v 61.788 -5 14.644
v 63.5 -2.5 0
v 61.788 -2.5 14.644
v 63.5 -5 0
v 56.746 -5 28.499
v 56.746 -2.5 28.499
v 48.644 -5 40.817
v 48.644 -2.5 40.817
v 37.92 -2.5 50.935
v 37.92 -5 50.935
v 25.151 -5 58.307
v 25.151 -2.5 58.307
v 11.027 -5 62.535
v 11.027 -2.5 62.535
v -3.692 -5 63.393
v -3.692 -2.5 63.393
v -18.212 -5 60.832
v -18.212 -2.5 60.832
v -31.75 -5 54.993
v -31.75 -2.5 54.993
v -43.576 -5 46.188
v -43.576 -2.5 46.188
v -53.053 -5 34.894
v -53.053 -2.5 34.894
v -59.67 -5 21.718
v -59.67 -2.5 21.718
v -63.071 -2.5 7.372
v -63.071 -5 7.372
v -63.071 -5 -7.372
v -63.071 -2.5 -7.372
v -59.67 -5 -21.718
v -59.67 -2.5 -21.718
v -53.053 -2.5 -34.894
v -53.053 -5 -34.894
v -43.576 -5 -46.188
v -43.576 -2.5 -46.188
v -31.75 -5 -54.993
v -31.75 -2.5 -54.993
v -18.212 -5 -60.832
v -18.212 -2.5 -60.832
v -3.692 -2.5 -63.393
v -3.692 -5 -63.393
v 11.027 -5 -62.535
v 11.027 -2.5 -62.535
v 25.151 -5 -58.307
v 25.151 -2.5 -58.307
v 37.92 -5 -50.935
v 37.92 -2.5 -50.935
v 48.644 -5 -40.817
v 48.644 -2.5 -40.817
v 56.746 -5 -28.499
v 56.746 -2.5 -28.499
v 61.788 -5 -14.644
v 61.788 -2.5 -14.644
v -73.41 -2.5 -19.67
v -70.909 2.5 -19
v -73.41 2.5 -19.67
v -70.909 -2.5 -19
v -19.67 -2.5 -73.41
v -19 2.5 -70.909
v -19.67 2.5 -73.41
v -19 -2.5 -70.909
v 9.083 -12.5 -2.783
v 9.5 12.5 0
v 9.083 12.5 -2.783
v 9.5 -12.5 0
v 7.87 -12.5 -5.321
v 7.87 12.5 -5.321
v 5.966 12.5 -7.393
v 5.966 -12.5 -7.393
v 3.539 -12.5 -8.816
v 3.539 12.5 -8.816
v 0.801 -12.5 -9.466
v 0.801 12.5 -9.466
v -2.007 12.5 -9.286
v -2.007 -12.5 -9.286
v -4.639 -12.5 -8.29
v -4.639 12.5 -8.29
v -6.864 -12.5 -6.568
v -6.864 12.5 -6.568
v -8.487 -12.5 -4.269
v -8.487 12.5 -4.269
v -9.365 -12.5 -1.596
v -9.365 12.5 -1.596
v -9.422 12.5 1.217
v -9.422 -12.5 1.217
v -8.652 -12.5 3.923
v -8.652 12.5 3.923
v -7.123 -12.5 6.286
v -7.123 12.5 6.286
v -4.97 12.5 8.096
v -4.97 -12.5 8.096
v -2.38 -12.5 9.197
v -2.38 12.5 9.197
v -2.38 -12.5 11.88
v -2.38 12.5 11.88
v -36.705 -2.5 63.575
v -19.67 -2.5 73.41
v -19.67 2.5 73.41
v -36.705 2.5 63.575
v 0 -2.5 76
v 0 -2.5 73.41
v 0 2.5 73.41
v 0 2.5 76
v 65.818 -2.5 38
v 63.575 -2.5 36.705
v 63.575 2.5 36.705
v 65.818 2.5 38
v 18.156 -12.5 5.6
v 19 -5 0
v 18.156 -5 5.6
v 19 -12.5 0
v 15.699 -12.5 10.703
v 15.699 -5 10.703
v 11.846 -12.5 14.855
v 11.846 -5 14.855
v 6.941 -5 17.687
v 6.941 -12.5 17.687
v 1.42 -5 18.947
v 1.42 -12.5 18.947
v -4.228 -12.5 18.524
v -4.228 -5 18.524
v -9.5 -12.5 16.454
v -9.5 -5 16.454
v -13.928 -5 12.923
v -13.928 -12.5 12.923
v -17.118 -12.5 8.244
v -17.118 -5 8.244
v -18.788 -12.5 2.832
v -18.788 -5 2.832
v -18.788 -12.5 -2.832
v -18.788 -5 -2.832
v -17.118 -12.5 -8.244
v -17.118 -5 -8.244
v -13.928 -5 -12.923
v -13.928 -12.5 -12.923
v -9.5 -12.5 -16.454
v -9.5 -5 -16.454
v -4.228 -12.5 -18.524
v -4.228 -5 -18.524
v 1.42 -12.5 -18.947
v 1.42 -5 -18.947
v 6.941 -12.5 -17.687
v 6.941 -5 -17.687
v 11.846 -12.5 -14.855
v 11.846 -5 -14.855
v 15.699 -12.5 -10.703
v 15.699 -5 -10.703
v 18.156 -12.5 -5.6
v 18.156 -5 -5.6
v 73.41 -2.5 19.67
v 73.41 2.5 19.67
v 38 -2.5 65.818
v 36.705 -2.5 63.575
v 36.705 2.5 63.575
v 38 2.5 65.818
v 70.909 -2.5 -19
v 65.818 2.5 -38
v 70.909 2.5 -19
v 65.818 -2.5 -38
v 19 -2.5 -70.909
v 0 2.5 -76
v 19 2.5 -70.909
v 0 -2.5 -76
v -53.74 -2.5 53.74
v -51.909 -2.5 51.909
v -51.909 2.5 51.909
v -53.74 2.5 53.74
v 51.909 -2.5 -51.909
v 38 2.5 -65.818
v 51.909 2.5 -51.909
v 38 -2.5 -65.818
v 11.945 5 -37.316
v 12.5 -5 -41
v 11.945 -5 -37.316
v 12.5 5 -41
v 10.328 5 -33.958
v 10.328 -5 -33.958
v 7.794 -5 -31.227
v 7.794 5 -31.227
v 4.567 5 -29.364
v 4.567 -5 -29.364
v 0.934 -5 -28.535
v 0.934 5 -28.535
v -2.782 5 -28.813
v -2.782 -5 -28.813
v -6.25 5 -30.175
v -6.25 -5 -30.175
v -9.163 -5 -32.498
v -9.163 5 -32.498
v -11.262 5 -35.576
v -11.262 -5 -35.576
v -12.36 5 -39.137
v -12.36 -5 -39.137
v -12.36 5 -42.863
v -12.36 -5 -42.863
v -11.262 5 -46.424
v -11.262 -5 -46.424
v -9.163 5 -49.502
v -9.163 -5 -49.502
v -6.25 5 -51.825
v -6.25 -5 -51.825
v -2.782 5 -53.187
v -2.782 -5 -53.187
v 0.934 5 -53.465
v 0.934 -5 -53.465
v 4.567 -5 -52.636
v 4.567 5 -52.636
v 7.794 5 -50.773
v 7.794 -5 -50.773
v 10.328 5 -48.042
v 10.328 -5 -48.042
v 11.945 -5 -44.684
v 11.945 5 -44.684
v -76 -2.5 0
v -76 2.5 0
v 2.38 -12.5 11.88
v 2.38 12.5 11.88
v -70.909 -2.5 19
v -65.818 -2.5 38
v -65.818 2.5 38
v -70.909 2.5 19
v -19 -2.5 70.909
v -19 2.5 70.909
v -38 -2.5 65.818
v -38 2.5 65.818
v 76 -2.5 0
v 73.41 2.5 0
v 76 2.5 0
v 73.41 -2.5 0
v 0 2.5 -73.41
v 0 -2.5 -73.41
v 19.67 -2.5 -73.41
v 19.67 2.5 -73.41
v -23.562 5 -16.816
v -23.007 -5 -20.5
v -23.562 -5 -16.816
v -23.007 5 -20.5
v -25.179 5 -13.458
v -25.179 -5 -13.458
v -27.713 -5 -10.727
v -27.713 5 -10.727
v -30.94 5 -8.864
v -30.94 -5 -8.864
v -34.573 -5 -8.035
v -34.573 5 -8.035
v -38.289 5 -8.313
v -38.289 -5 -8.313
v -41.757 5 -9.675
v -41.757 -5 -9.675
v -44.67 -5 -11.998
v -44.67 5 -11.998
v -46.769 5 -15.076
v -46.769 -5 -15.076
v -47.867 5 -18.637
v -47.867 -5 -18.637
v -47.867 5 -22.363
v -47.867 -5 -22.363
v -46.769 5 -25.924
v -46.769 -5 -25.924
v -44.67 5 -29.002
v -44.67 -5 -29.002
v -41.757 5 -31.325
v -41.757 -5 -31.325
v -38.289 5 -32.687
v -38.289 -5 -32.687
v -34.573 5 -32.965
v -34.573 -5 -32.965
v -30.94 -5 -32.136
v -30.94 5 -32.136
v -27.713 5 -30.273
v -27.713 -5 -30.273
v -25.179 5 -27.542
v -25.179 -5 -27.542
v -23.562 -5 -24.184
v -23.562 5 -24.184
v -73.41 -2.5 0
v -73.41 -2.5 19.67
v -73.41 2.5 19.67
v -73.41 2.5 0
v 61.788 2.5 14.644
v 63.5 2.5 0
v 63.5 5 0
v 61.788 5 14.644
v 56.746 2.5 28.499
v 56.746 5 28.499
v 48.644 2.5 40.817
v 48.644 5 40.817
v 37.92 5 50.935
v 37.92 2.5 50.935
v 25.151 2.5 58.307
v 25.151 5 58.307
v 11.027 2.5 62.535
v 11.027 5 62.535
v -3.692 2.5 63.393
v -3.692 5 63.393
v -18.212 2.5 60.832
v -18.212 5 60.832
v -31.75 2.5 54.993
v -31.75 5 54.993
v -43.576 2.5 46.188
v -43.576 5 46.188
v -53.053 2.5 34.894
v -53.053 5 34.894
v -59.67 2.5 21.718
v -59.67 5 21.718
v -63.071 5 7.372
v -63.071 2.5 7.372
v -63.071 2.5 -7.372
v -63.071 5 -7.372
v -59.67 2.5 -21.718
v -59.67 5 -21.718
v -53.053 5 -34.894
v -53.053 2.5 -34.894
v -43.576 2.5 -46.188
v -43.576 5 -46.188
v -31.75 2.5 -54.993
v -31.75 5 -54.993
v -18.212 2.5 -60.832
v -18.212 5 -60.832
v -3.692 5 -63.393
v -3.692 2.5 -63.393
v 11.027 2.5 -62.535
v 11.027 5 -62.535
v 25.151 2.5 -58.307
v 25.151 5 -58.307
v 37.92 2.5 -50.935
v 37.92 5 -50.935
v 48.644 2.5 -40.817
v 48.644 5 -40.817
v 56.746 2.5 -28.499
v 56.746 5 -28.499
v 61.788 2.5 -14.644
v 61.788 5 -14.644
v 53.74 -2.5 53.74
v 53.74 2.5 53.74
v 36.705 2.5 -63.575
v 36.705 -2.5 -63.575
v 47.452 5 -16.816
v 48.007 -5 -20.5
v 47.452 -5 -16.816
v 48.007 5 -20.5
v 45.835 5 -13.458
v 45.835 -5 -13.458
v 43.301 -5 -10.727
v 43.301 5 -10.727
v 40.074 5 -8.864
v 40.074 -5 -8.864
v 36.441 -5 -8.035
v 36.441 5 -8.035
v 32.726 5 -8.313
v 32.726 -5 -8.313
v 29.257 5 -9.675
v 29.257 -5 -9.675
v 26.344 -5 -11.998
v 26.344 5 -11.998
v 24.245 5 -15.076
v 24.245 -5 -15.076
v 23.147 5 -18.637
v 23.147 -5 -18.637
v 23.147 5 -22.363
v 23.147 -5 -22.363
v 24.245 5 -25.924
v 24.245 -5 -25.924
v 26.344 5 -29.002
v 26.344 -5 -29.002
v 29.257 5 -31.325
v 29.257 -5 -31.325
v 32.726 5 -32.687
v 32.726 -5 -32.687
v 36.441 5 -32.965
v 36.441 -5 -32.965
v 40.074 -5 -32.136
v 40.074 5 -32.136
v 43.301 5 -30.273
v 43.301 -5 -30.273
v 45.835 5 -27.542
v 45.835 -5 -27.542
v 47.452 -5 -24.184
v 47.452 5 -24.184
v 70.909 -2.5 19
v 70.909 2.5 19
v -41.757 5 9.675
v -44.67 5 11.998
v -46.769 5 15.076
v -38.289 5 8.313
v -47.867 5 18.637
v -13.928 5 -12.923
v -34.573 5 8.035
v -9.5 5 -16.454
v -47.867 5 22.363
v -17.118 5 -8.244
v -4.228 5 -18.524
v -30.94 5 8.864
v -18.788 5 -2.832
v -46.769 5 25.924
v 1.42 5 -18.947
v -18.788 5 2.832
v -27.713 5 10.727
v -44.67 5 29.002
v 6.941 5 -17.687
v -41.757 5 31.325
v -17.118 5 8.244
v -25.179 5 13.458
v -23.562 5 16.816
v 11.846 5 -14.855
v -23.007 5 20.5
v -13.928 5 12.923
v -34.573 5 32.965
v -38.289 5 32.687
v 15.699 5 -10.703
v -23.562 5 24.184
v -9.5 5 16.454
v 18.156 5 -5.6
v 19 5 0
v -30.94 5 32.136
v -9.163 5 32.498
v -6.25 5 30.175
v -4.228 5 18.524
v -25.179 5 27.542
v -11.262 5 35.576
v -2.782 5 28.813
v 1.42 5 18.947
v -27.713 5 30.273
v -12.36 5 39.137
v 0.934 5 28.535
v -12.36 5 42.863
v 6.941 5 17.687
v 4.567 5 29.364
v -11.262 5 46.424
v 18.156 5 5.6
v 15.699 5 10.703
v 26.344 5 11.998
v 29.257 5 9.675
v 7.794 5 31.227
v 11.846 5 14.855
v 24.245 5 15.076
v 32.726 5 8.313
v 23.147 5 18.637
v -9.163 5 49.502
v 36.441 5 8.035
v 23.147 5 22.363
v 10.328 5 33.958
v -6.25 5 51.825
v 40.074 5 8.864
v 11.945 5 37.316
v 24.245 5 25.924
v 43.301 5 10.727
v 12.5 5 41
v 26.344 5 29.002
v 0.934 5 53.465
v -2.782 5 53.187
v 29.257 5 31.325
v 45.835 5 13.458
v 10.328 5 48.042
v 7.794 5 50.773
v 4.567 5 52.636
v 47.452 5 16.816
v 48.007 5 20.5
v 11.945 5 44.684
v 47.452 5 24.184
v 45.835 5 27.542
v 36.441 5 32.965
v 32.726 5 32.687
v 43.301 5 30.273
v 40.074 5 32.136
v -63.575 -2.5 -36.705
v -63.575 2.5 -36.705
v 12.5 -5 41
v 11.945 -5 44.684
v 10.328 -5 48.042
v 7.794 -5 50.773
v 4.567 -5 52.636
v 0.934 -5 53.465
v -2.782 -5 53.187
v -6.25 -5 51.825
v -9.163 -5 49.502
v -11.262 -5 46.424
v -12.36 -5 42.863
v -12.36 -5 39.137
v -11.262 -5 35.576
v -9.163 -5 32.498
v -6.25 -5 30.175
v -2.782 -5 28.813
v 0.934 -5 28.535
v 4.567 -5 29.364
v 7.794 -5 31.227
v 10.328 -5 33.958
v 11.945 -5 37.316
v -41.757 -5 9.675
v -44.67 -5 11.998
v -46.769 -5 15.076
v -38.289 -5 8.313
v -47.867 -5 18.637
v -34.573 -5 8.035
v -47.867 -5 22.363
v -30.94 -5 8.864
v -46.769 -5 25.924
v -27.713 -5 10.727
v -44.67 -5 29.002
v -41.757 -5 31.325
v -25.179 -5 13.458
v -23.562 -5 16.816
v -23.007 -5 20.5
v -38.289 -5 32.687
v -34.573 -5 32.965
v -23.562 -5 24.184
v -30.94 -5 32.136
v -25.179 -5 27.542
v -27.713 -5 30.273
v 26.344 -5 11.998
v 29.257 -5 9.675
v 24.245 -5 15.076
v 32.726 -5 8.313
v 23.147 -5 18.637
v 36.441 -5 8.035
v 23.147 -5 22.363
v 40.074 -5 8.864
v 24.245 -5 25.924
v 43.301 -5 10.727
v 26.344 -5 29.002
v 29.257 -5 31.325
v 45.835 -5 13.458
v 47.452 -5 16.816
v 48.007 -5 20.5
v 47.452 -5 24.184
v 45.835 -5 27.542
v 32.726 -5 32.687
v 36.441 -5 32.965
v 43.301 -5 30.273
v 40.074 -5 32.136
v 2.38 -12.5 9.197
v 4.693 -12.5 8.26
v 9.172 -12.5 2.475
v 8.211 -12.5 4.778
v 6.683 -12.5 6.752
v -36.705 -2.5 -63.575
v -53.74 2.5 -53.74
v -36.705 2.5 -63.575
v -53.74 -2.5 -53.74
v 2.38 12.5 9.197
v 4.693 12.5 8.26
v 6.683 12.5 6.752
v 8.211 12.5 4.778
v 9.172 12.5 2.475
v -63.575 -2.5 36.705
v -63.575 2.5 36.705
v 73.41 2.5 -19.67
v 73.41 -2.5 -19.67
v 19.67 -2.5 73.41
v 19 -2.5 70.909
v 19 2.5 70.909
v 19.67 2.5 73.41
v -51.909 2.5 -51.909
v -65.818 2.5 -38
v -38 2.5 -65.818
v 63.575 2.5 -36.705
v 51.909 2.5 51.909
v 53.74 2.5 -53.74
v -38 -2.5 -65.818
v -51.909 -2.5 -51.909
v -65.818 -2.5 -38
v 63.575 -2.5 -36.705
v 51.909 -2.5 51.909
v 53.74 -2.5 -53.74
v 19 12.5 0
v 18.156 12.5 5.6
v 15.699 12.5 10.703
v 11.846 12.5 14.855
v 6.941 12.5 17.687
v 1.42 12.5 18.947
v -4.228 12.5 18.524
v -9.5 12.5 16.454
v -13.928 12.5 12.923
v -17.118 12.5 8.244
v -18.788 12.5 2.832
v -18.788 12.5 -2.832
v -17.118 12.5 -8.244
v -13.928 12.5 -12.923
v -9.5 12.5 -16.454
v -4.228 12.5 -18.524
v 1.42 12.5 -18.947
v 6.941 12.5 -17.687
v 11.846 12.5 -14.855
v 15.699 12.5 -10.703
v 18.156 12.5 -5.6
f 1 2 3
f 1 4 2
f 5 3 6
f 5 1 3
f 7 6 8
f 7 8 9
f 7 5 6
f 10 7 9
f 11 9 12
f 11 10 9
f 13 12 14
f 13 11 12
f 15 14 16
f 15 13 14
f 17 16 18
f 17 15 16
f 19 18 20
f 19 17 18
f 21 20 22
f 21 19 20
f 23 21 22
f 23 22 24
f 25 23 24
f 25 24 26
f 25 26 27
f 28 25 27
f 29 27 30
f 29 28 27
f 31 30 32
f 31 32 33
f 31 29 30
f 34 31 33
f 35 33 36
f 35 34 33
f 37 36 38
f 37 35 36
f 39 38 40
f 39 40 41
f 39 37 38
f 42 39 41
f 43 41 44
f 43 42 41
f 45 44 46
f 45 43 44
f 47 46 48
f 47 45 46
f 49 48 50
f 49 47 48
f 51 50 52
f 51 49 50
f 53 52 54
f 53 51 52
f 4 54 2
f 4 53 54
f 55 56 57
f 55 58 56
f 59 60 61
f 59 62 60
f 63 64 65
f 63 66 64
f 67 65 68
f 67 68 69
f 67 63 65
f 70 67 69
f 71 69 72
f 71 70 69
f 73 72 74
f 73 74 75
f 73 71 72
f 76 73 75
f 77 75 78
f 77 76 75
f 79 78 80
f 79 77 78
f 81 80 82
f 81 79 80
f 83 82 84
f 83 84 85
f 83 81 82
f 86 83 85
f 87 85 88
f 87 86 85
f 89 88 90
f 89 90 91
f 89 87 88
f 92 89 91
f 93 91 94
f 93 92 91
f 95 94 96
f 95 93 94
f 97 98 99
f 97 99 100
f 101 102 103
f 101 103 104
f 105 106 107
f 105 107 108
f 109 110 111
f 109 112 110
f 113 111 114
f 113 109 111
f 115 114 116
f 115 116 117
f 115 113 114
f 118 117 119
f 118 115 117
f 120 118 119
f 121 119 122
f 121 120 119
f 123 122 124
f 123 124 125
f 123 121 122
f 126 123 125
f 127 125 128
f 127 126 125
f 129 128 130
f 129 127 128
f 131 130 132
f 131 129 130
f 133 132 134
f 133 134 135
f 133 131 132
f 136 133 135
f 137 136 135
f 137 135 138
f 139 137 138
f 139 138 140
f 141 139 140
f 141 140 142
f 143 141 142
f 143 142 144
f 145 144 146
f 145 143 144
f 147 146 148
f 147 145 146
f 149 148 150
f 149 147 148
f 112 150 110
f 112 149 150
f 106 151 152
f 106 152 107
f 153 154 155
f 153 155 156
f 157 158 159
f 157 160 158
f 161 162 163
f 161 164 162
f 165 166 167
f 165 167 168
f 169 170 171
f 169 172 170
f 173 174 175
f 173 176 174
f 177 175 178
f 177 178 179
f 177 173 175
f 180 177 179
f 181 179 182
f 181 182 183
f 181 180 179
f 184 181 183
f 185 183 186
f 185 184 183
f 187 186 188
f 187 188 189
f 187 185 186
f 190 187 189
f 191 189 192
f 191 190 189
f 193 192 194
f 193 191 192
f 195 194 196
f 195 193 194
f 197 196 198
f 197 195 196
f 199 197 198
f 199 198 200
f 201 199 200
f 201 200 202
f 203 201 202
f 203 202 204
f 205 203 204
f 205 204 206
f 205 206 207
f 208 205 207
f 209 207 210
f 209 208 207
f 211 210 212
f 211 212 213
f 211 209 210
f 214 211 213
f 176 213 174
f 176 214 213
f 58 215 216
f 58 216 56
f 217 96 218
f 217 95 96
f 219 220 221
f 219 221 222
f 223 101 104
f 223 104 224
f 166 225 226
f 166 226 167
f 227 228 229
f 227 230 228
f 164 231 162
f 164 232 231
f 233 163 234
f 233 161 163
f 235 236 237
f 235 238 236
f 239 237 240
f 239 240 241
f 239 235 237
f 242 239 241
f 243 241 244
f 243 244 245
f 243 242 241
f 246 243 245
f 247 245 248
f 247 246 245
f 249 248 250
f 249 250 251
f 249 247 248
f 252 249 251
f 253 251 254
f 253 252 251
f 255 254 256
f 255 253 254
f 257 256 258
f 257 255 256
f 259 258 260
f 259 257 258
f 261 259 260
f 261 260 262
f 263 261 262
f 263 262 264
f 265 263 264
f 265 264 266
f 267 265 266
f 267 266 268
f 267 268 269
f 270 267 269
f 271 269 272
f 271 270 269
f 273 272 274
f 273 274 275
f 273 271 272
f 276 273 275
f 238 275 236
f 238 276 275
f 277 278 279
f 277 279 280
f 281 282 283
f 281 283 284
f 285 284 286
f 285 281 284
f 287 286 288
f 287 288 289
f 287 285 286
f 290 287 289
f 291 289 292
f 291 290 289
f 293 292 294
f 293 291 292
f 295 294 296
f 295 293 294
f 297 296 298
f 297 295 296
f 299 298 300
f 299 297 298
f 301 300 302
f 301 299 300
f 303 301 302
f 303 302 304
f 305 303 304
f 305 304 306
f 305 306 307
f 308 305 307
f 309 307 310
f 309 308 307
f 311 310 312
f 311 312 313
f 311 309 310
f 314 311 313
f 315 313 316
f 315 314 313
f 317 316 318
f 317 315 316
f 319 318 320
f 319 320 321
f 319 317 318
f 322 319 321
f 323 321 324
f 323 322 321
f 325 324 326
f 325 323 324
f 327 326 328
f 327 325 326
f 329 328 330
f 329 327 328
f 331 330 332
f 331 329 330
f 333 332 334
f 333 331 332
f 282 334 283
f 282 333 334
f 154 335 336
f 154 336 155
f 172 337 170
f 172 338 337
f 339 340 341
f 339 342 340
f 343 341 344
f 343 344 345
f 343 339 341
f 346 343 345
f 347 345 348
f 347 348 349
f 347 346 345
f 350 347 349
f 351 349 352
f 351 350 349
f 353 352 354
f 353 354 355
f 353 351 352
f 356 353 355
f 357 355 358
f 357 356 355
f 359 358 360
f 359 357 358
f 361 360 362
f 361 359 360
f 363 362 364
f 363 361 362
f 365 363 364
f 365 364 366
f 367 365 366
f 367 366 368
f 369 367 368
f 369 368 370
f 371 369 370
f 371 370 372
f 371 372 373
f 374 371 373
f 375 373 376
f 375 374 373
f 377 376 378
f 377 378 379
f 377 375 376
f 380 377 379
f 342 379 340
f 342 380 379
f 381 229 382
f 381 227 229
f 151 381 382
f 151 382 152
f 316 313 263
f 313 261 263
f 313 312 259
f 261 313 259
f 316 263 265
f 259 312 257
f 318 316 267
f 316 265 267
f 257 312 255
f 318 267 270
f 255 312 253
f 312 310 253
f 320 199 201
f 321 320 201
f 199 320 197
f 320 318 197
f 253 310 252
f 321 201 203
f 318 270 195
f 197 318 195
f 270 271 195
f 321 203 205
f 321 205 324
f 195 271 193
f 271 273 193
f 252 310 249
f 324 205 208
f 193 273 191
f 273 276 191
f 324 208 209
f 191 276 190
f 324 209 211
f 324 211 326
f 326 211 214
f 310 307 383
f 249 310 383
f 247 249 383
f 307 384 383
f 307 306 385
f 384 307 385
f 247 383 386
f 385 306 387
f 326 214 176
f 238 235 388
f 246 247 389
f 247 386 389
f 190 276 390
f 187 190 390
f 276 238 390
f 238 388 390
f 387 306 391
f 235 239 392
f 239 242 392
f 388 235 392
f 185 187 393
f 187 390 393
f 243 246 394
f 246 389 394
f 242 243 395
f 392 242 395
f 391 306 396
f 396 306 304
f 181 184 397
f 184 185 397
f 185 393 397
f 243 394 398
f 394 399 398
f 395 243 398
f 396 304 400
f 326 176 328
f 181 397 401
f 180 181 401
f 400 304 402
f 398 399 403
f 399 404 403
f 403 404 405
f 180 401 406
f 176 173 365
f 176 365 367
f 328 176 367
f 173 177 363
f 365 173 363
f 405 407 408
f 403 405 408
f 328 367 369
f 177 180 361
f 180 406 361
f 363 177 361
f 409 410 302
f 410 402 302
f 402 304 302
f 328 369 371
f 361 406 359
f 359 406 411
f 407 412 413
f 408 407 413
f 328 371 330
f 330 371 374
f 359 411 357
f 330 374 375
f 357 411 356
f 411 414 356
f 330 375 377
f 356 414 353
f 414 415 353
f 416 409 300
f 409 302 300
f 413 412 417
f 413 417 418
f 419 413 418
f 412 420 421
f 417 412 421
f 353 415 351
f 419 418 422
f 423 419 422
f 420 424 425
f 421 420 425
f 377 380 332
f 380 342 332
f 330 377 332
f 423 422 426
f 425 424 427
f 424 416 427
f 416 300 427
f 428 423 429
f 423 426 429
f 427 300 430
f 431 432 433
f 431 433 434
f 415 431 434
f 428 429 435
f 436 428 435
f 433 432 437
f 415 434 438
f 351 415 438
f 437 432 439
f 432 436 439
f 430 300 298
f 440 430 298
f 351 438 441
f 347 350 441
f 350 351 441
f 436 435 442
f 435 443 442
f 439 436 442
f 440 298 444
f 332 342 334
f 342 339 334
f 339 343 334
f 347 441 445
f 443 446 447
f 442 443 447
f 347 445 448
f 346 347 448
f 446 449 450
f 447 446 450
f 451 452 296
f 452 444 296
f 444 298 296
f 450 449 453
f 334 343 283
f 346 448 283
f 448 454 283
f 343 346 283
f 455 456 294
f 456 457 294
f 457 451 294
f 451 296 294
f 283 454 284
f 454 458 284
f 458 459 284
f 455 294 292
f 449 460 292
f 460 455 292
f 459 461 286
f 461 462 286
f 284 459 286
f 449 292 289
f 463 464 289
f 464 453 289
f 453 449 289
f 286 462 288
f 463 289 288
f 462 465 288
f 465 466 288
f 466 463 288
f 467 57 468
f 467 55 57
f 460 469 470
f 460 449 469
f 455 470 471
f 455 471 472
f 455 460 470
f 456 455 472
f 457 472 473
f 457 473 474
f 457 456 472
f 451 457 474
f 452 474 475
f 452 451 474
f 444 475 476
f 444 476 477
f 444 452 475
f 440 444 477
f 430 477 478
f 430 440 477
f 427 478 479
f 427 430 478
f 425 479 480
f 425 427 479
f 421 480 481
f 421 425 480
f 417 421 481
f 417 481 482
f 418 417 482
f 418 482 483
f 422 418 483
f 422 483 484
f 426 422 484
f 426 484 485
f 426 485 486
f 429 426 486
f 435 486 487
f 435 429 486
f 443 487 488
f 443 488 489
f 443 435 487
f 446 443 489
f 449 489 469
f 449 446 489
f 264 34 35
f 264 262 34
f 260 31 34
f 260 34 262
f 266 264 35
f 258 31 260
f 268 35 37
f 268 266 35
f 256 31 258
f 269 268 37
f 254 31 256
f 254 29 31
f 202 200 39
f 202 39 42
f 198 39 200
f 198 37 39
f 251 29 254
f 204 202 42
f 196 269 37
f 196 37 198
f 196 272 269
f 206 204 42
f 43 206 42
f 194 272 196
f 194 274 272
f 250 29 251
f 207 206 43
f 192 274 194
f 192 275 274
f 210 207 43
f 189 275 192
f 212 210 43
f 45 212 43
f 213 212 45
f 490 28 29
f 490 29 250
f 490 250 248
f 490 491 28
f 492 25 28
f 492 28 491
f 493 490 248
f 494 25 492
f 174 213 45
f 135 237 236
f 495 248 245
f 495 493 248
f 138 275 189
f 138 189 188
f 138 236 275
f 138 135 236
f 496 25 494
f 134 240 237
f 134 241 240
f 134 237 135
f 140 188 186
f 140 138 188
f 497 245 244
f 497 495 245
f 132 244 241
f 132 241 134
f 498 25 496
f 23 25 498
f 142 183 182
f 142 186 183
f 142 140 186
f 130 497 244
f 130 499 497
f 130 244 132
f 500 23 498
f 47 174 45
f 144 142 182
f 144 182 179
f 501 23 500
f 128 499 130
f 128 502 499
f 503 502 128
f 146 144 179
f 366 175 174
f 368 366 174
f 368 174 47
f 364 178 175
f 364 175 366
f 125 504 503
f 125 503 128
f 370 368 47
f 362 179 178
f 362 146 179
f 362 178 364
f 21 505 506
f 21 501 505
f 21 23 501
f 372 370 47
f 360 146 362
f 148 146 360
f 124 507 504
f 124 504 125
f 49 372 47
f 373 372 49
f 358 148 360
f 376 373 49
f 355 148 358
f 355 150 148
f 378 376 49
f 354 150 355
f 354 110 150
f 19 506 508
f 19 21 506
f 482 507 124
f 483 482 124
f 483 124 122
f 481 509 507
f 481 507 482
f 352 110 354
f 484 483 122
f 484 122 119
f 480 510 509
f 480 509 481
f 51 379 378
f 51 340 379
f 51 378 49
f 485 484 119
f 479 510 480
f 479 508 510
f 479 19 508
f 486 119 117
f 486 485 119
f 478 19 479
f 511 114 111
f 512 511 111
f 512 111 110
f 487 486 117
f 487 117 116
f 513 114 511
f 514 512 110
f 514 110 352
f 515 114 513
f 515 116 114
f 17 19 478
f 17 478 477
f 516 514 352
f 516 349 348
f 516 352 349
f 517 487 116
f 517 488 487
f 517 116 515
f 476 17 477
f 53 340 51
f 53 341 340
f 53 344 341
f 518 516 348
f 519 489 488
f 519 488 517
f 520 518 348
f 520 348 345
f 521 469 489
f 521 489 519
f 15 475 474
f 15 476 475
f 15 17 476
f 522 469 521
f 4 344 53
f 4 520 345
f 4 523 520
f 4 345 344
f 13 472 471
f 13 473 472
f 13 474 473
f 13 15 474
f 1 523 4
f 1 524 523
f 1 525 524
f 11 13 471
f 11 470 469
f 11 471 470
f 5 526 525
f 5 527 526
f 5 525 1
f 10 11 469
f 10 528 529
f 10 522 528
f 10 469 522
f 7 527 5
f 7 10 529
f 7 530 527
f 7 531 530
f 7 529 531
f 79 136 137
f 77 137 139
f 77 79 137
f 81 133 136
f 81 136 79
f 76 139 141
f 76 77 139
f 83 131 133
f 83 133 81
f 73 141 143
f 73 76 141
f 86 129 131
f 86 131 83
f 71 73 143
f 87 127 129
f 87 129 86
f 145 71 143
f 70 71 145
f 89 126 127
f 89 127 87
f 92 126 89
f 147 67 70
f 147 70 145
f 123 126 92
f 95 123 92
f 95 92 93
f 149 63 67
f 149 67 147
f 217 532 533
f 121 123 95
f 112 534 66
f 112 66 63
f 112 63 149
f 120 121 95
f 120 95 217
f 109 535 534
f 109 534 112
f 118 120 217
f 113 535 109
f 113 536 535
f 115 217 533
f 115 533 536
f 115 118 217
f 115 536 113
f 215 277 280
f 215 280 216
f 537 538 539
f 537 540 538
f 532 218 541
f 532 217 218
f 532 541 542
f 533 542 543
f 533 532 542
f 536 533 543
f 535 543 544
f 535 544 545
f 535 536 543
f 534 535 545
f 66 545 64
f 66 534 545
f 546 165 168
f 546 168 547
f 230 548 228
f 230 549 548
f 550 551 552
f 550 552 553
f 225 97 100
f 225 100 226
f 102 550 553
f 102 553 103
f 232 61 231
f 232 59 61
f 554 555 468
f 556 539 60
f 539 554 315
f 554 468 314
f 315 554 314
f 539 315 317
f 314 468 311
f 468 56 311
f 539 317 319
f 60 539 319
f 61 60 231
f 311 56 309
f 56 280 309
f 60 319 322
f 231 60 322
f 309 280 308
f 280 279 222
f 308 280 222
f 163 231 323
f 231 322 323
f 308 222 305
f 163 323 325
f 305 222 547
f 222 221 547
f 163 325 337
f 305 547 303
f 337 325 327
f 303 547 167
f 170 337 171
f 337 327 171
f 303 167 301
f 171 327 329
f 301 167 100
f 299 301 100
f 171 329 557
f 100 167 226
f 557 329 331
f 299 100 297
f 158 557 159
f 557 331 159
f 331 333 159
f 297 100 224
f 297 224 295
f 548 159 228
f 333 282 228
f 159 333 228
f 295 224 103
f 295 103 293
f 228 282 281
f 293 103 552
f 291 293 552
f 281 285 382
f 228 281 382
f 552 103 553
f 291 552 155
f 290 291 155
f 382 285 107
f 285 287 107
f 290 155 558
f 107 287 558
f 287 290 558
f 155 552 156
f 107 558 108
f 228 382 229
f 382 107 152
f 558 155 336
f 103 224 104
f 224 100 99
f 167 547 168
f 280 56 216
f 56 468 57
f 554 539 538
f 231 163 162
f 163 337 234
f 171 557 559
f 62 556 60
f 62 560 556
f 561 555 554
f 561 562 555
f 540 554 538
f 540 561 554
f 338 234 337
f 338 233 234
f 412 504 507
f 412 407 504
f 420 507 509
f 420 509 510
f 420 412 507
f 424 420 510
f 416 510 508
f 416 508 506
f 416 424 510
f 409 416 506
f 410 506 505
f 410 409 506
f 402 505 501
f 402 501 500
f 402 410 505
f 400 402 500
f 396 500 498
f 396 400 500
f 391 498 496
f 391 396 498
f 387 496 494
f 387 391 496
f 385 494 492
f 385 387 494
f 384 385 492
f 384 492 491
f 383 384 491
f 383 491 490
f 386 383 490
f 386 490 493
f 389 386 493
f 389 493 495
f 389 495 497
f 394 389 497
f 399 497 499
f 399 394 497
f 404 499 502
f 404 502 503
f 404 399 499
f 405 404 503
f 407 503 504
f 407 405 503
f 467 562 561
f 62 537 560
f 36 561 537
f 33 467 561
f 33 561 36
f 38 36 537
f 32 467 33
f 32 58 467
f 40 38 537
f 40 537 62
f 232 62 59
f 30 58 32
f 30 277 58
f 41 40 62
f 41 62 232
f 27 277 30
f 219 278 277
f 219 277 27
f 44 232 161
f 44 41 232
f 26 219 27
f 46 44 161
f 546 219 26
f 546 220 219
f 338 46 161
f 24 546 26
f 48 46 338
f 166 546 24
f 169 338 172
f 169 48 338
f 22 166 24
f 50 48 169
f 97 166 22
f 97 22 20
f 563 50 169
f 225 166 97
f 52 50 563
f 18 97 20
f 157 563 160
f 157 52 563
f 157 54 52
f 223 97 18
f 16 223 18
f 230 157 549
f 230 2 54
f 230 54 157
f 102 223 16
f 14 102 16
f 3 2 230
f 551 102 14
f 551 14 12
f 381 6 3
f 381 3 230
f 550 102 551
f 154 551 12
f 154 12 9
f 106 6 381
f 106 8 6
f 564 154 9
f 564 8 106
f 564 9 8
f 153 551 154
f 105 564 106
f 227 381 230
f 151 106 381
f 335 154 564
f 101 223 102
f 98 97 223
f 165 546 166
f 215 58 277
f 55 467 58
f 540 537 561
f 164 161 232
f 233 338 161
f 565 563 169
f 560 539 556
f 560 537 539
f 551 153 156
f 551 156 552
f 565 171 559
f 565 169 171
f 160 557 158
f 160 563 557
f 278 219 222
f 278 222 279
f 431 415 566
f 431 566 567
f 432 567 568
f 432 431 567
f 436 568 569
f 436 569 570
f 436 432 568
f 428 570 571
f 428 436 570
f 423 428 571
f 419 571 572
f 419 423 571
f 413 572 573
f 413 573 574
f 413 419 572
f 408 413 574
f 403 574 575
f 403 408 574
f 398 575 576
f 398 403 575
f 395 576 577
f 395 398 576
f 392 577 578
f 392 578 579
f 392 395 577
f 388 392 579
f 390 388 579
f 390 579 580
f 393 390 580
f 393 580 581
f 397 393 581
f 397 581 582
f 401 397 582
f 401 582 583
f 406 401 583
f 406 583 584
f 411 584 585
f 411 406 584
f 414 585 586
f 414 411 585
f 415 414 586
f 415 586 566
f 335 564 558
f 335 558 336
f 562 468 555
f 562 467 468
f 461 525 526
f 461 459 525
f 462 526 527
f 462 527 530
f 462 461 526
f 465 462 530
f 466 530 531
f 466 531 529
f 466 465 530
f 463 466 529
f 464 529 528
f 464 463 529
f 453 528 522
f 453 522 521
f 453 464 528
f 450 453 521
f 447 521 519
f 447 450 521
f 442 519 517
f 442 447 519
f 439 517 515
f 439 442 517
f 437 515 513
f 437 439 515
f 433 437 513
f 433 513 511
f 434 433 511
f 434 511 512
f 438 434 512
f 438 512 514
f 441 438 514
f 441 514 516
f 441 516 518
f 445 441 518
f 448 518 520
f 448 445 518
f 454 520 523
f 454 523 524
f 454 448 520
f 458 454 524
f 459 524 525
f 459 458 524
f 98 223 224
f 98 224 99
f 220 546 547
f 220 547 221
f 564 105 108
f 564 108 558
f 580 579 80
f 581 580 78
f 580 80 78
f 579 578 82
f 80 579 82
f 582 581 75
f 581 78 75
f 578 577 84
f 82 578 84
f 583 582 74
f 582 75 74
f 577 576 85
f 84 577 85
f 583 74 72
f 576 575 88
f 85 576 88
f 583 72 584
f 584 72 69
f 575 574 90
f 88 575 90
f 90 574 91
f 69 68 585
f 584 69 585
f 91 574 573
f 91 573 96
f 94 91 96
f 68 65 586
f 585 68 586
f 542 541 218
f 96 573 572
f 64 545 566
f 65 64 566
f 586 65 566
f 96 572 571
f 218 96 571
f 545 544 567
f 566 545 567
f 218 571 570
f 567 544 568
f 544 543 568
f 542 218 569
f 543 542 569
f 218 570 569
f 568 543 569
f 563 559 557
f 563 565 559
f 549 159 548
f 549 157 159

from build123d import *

# Parameters (mm, degrees)
F0_R     = 63.5
F1_DEPTH = 2.5
F2_R     = 63.5
F2_R_2   = 12.5
F2_R_3   = 19
F3_DEPTH = 5
F4_R     = 19
F5_DEPTH = 12.5


with BuildPart() as f1:
    # F0 (on Front) → F1 (new body, symmetric)
    with BuildSketch(Plane.XZ):
        Polygon((76, 0), (70.908965, 19), (73.410363, 19.670247), (63.575239, 36.705181), (65.817931, 38), (51.908965, 51.908965), (53.740115, 53.740115), (36.705181, 63.575239), (38, 65.817931), (19, 70.908965), (19.670247, 73.410363), (0, 73.410363), (0, 76), (-19, 70.908965), (-19.670247, 73.410363), (-36.705181, 63.575239), (-38, 65.817931), (-51.908965, 51.908965), (-53.740115, 53.740115), (-63.575239, 36.705181), (-65.817931, 38), (-70.908965, 19), (-73.410363, 19.670247), (-73.410363, 0), (-76, 0), (-70.908965, -19), (-73.410363, -19.670247), (-63.575239, -36.705181), (-65.817931, -38), (-51.908965, -51.908965), (-53.740115, -53.740115), (-36.705181, -63.575239), (-38, -65.817931), (-19, -70.908965), (-19.670247, -73.410363), (0, -73.410363), (0, -76), (19, -70.908965), (19.670247, -73.410363), (36.705181, -63.575239), (38, -65.817931), (51.908965, -51.908965), (53.740115, -53.740115), (63.575239, -36.705181), (65.817931, -38), (70.908965, -19), (73.410363, -19.670247), (73.410363, 0), align=None)
        Circle(F0_R, mode=Mode.SUBTRACT)
    extrude(amount=F1_DEPTH, both=True)

    # F2 (on Front) → F3 (join, symmetric)
    with BuildSketch(Plane.XZ):
        Circle(F2_R)
        with Locations((-35.507042, -20.5)):
            Circle(F2_R_2, mode=Mode.SUBTRACT)
        with Locations((0, -41)):
            Circle(F2_R_2, mode=Mode.SUBTRACT)
        with Locations((35.507042, -20.5)):
            Circle(F2_R_2, mode=Mode.SUBTRACT)
        with Locations((-35.507042, 20.5)):
            Circle(F2_R_2, mode=Mode.SUBTRACT)
        Circle(F2_R_3, mode=Mode.SUBTRACT)
        with Locations((35.507042, 20.5)):
            Circle(F2_R_2, mode=Mode.SUBTRACT)
        with Locations((0, 41)):
            Circle(F2_R_2, mode=Mode.SUBTRACT)
    extrude(amount=F3_DEPTH, both=True)

    # F4 (on Front) → F5 (join, symmetric)
    with BuildSketch(Plane.XZ):
        Circle(F4_R)
        with BuildLine():
            ThreePointArc((2.38, 9.197043), (7.51199, 5.815497), (9.5, 0))
            ThreePointArc((9.5, 0), (-5.815497, -7.51199), (-2.38, 9.197043))
            Line((-2.38, 9.197043), (-2.38, 11.88))
            Line((-2.38, 11.88), (0, 11.88))
            Line((0, 11.88), (2.38, 11.88))
            Line((2.38, 11.88), (2.38, 9.197043))
        make_face(mode=Mode.SUBTRACT)
    extrude(amount=F5_DEPTH, both=True)


solid = f1.part
